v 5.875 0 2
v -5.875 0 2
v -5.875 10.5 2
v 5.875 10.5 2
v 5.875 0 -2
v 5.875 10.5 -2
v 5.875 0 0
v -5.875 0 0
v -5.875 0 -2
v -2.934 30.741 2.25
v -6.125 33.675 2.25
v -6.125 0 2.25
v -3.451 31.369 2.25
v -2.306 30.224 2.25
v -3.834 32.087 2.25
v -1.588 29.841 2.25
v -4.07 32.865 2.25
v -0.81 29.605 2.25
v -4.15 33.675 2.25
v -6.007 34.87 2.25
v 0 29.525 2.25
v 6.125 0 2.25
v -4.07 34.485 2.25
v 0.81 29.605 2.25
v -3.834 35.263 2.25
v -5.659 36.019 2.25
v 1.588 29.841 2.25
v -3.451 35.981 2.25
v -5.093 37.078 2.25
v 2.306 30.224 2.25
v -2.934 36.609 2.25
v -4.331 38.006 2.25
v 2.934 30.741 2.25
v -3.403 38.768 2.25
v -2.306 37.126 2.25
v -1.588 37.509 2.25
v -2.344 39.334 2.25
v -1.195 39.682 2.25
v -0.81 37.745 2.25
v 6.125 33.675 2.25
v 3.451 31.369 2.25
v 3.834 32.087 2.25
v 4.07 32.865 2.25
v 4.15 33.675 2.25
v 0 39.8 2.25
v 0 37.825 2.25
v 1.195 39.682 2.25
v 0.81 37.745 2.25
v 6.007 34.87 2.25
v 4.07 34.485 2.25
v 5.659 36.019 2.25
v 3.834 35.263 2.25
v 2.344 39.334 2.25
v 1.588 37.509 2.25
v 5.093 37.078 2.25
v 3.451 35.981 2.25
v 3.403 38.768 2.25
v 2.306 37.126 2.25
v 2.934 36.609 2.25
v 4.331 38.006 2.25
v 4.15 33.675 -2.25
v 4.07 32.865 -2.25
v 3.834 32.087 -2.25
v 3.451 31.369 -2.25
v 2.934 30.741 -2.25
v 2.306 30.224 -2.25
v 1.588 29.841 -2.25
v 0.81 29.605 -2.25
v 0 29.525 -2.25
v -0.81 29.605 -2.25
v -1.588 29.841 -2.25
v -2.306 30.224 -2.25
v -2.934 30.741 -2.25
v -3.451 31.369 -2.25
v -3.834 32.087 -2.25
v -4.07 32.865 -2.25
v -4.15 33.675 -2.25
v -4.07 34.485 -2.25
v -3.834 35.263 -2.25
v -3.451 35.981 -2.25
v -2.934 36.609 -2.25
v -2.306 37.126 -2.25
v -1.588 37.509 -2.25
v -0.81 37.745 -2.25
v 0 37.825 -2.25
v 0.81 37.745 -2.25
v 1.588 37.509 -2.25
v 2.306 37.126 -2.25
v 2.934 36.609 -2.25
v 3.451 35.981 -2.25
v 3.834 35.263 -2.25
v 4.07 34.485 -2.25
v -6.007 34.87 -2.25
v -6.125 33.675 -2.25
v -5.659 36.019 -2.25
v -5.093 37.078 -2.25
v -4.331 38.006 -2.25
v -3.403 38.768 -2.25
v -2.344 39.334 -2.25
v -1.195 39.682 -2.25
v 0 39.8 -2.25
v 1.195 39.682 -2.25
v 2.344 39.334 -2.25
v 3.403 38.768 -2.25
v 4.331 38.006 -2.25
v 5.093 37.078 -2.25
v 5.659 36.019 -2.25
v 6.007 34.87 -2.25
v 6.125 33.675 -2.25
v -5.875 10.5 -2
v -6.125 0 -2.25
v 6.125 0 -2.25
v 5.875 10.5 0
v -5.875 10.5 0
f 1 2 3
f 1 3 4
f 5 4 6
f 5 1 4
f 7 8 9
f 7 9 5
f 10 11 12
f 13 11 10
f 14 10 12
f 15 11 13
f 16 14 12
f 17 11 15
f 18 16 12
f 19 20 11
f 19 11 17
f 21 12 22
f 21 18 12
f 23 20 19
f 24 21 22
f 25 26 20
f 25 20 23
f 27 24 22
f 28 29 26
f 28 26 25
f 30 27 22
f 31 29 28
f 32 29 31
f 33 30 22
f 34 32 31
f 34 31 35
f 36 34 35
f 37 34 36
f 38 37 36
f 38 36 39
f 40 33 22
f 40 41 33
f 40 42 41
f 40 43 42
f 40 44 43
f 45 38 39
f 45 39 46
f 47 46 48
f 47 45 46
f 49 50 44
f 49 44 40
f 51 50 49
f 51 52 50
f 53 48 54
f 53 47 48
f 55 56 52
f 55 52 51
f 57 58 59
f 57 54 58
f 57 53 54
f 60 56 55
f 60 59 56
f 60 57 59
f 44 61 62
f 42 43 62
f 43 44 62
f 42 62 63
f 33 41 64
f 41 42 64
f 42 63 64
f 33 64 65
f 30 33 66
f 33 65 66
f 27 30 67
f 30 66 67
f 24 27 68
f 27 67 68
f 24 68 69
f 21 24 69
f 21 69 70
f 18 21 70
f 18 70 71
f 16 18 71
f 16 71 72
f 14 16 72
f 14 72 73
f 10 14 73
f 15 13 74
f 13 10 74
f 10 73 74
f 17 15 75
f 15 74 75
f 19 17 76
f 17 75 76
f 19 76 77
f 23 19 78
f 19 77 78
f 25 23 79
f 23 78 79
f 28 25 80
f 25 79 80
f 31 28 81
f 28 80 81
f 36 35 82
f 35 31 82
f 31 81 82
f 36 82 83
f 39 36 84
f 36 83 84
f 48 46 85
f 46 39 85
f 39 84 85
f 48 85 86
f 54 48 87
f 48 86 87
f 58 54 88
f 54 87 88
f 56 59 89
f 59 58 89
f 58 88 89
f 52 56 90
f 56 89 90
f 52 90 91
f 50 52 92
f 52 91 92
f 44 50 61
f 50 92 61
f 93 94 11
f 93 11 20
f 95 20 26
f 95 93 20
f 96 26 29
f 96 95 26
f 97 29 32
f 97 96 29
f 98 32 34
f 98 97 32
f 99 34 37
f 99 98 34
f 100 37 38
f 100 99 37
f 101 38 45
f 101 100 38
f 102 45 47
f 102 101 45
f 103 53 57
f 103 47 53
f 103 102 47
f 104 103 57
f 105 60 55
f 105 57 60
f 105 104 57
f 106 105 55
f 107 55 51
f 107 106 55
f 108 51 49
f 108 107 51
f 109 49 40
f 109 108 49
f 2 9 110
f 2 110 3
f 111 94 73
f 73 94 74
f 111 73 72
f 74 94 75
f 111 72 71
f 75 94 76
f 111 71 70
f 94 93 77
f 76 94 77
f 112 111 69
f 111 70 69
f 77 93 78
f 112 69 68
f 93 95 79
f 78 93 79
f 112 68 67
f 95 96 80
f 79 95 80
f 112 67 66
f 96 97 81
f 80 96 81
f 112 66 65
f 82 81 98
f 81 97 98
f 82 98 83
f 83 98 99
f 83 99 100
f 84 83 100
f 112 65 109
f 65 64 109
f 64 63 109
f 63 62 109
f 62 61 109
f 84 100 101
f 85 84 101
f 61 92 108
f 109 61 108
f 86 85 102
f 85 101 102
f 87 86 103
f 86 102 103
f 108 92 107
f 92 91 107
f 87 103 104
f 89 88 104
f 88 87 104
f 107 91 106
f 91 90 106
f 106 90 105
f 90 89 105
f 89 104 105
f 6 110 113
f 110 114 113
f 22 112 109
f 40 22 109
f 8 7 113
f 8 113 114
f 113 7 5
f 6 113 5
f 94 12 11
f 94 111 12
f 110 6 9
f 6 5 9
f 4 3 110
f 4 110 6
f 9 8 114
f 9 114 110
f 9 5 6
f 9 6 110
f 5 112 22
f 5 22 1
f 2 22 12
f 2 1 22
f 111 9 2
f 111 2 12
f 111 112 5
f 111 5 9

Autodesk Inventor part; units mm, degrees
ref_plane "YZ Plane" through (0, 0, 0) normal (1, 0, 0) x (0, 1, 0)
ref_plane "XZ Plane" through (0, 0, 0) normal (0, 1, 0) x (-1, 0, 0)
ref_plane "XY Plane" through (0, 0, 0) normal (0, 0, 1) x (1, 0, 0)
sketch "Boceto1" plane through (0, 0, 0) normal (0, 0, 1) x (1, 0, 0)
  line L0 (6.125, 0) -> (-6.125, 0)
  line L1 (-6.125, 0) -> (-6.125, 33.675)
  circle A0 centre (0, 33.675) radius 4.15
  arc A1 (6.125, 33.675) -> (-6.125, 33.675) centre (0, 33.675) ccw
  line L2 (6.125, 0) -> (6.125, 33.675)
  point P0 (0, 0)
  point P1 (0, 0)
  dimension "d44" = 39.8
  dimension "d45" = 12.25
  dimension "d46" = 8.3
extrude "Extrusión4" add sketch "Boceto1" along normal mid plane 4.5
sketch "Boceto7" plane through (-6.125, 0, 2.25) normal (0, -1, 0) x (1, 0, 0)
  line L0 (12, -4.25) -> (0.25, -4.25)
  line L1 (0.25, -4.25) -> (0.25, -0.25)
  line L2 (0.25, -0.25) -> (12, -0.25)
  line L3 (12, -0.25) -> (12, -4.25)
  line L4 (12, -4.25) -> (0.25, -0.25) construction
  line L5 (0.25, -4.25) -> (12, -0.25) construction
  line L6 (0, 0) -> (12.25, 0) projected
  line L7 (0, -4.5) -> (0, 0) projected
  point P0 (6.125, -2.25)
  dimension "d49" = 0.25
  dimension "d50" = 0.25
extrude "Extrusión5" cut sketch "Boceto7" against normal blind 10.5
sketch "Boceto8" plane through (-6.125, 0, 2.25) normal (0, -1, 0) x (1, 0, 0)
  line L0 (0.25, -4.25) -> (0.25, -0.25) construction
  line L1 (0.25, -0.25) -> (12, -0.25) construction
  line L2 (12, -0.25) -> (12, -4.25) construction
  line L3 (12, -4.25) -> (0.25, -4.25) construction
  line L4 (12.25, -4.5) -> (12.25, 0) construction
  line L5 (0, 0) -> (12.25, 0) construction
  line L6 (0, -4.5) -> (0, 0) construction
  line L7 (12.25, -4.5) -> (0, -4.5) construction
  line L8 (12, -4.25) -> (0.25, -4.25) projected
  line L9 (12, -0.25) -> (12, -4.25) projected
  line L10 (0.25, -4.25) -> (12, -4.25)
  line L11 (12, -4.25) -> (12, -2.25)
  line L12 (12, -2.25) -> (0.25, -2.25)
  line L13 (0.25, -2.25) -> (0.25, -4.25)
  point P0 (6.125, -2.25)
extrude "Extrusión6" add sketch "Boceto8" against normal up to surface (10.5 mm away) separate body
equation "\"d50\" = d49"
properties part number "Metal USB stick with hole" material "Acero"
